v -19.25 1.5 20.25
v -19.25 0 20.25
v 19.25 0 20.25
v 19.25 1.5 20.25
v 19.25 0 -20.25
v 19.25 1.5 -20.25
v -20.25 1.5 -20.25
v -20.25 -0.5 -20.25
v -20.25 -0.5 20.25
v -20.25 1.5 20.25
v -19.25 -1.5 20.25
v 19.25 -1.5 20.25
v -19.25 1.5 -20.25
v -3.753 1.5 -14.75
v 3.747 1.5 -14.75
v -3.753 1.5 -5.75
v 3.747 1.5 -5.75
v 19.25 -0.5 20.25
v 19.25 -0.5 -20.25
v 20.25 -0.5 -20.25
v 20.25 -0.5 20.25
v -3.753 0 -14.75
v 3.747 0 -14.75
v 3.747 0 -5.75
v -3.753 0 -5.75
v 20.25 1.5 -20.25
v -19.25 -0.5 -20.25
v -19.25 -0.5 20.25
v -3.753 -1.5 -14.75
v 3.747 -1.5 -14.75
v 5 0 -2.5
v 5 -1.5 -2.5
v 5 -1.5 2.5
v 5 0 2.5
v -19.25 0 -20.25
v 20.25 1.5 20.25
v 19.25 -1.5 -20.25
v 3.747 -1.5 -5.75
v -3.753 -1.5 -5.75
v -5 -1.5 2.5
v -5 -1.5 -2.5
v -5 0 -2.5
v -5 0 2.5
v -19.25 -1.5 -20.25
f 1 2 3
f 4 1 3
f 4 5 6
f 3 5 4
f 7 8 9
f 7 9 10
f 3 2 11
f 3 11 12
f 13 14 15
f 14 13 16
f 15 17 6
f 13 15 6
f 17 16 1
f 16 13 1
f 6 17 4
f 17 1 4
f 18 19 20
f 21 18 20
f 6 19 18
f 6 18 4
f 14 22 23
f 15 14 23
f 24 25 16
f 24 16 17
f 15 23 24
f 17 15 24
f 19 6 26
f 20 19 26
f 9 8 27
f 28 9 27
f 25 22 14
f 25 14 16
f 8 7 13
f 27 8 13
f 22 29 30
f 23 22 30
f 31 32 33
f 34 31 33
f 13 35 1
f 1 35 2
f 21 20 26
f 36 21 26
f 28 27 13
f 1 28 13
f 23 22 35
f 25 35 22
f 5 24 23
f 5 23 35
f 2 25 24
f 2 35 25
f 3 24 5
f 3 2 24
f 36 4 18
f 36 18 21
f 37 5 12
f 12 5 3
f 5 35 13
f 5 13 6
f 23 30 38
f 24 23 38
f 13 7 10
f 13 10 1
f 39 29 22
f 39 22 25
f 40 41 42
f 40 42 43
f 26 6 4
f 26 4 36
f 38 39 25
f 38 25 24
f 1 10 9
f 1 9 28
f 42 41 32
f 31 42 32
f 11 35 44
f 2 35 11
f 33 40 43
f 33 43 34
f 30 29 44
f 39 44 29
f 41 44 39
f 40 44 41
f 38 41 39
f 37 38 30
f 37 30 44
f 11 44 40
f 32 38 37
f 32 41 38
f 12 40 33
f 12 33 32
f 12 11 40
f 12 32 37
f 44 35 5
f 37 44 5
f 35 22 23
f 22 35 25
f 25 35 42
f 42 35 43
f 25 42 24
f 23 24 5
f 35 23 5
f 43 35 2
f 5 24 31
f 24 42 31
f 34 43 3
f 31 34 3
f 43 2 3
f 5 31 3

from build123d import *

# Parameters (mm, degrees)
F2_W      = 1
F2_H      = 2
F3_DEPTH  = 40.5
F0_W      = 38.5
F0_H      = 40.5
F4_DEPTH  = 1.5
F5_DEPTH  = 1.5
F7_W      = 10
F7_H      = 5
F8_DEPTH  = 2
F9_W      = 7.5
F9_H      = 9
F10_DEPTH = 76.2
F12_W     = 7.5
F12_H     = 9
F13_DEPTH = 3


with BuildPart() as f3:
    # F2 (on line) → F3 (new body)
    with BuildSketch(Plane.XY.offset(20.25)):
        with Locations((-19.75, 0.5)):
            Rectangle(F2_W, F2_H)
    extrude(amount=-F3_DEPTH)

    # F12 (on offset) → F13 (cut)
    with BuildSketch(Plane(origin=(0, 1.5, 0), x_dir=(-1, 0, 0), z_dir=(0, 1, 0))):
        with Locations((0.0032, -10.25)):
            Rectangle(F12_W, F12_H)
    extrude(amount=-F13_DEPTH, mode=Mode.SUBTRACT)


with BuildPart() as f3b:
    # F2 (on line) → F3, piece 2 (new body)
    with BuildSketch(Plane.XY.offset(20.25)):
        with Locations((19.75, 0.5)):
            Rectangle(F2_W, F2_H)
    extrude(amount=-F3_DEPTH)


with BuildPart() as f4:
    # F0 (on Front) → F4 (new body)
    with BuildSketch(Plane.XZ):
        Rectangle(F0_W, F0_H)
    extrude(amount=-F4_DEPTH)


with BuildPart() as f5:
    # F5 (new): a face of the model
    f5_faces = [f4.part.faces().sort_by_distance(p)[0] for p in [
        (0, 0, 0),
    ]]
    extrude(f5_faces, amount=F5_DEPTH)

    # F7 (on offset) → F8 (cut)
    with BuildSketch(Plane.XZ.offset(1.5)):
        Rectangle(F7_W, F7_H)
    extrude(amount=-F8_DEPTH, mode=Mode.SUBTRACT)


with BuildPart() as f10_tool:
    # F9 (on offset) → F10 (new body)
    with BuildSketch(Plane.XZ.offset(1.5)):
        with Locations((-0.0032, -10.25)):
            Rectangle(F9_W, F9_H)
    extrude(amount=-F10_DEPTH)


with BuildPart() as f4_1:
    add(f4.part)

    # F10: cut by f10_tool
    add(f10_tool.part, mode=Mode.SUBTRACT)


with BuildPart() as f5_1:
    add(f5.part)

    # F10: cut by f10_tool
    add(f10_tool.part, mode=Mode.SUBTRACT)


solid = Compound([f3.part, f3b.part, f4_1.part, f5_1.part])
